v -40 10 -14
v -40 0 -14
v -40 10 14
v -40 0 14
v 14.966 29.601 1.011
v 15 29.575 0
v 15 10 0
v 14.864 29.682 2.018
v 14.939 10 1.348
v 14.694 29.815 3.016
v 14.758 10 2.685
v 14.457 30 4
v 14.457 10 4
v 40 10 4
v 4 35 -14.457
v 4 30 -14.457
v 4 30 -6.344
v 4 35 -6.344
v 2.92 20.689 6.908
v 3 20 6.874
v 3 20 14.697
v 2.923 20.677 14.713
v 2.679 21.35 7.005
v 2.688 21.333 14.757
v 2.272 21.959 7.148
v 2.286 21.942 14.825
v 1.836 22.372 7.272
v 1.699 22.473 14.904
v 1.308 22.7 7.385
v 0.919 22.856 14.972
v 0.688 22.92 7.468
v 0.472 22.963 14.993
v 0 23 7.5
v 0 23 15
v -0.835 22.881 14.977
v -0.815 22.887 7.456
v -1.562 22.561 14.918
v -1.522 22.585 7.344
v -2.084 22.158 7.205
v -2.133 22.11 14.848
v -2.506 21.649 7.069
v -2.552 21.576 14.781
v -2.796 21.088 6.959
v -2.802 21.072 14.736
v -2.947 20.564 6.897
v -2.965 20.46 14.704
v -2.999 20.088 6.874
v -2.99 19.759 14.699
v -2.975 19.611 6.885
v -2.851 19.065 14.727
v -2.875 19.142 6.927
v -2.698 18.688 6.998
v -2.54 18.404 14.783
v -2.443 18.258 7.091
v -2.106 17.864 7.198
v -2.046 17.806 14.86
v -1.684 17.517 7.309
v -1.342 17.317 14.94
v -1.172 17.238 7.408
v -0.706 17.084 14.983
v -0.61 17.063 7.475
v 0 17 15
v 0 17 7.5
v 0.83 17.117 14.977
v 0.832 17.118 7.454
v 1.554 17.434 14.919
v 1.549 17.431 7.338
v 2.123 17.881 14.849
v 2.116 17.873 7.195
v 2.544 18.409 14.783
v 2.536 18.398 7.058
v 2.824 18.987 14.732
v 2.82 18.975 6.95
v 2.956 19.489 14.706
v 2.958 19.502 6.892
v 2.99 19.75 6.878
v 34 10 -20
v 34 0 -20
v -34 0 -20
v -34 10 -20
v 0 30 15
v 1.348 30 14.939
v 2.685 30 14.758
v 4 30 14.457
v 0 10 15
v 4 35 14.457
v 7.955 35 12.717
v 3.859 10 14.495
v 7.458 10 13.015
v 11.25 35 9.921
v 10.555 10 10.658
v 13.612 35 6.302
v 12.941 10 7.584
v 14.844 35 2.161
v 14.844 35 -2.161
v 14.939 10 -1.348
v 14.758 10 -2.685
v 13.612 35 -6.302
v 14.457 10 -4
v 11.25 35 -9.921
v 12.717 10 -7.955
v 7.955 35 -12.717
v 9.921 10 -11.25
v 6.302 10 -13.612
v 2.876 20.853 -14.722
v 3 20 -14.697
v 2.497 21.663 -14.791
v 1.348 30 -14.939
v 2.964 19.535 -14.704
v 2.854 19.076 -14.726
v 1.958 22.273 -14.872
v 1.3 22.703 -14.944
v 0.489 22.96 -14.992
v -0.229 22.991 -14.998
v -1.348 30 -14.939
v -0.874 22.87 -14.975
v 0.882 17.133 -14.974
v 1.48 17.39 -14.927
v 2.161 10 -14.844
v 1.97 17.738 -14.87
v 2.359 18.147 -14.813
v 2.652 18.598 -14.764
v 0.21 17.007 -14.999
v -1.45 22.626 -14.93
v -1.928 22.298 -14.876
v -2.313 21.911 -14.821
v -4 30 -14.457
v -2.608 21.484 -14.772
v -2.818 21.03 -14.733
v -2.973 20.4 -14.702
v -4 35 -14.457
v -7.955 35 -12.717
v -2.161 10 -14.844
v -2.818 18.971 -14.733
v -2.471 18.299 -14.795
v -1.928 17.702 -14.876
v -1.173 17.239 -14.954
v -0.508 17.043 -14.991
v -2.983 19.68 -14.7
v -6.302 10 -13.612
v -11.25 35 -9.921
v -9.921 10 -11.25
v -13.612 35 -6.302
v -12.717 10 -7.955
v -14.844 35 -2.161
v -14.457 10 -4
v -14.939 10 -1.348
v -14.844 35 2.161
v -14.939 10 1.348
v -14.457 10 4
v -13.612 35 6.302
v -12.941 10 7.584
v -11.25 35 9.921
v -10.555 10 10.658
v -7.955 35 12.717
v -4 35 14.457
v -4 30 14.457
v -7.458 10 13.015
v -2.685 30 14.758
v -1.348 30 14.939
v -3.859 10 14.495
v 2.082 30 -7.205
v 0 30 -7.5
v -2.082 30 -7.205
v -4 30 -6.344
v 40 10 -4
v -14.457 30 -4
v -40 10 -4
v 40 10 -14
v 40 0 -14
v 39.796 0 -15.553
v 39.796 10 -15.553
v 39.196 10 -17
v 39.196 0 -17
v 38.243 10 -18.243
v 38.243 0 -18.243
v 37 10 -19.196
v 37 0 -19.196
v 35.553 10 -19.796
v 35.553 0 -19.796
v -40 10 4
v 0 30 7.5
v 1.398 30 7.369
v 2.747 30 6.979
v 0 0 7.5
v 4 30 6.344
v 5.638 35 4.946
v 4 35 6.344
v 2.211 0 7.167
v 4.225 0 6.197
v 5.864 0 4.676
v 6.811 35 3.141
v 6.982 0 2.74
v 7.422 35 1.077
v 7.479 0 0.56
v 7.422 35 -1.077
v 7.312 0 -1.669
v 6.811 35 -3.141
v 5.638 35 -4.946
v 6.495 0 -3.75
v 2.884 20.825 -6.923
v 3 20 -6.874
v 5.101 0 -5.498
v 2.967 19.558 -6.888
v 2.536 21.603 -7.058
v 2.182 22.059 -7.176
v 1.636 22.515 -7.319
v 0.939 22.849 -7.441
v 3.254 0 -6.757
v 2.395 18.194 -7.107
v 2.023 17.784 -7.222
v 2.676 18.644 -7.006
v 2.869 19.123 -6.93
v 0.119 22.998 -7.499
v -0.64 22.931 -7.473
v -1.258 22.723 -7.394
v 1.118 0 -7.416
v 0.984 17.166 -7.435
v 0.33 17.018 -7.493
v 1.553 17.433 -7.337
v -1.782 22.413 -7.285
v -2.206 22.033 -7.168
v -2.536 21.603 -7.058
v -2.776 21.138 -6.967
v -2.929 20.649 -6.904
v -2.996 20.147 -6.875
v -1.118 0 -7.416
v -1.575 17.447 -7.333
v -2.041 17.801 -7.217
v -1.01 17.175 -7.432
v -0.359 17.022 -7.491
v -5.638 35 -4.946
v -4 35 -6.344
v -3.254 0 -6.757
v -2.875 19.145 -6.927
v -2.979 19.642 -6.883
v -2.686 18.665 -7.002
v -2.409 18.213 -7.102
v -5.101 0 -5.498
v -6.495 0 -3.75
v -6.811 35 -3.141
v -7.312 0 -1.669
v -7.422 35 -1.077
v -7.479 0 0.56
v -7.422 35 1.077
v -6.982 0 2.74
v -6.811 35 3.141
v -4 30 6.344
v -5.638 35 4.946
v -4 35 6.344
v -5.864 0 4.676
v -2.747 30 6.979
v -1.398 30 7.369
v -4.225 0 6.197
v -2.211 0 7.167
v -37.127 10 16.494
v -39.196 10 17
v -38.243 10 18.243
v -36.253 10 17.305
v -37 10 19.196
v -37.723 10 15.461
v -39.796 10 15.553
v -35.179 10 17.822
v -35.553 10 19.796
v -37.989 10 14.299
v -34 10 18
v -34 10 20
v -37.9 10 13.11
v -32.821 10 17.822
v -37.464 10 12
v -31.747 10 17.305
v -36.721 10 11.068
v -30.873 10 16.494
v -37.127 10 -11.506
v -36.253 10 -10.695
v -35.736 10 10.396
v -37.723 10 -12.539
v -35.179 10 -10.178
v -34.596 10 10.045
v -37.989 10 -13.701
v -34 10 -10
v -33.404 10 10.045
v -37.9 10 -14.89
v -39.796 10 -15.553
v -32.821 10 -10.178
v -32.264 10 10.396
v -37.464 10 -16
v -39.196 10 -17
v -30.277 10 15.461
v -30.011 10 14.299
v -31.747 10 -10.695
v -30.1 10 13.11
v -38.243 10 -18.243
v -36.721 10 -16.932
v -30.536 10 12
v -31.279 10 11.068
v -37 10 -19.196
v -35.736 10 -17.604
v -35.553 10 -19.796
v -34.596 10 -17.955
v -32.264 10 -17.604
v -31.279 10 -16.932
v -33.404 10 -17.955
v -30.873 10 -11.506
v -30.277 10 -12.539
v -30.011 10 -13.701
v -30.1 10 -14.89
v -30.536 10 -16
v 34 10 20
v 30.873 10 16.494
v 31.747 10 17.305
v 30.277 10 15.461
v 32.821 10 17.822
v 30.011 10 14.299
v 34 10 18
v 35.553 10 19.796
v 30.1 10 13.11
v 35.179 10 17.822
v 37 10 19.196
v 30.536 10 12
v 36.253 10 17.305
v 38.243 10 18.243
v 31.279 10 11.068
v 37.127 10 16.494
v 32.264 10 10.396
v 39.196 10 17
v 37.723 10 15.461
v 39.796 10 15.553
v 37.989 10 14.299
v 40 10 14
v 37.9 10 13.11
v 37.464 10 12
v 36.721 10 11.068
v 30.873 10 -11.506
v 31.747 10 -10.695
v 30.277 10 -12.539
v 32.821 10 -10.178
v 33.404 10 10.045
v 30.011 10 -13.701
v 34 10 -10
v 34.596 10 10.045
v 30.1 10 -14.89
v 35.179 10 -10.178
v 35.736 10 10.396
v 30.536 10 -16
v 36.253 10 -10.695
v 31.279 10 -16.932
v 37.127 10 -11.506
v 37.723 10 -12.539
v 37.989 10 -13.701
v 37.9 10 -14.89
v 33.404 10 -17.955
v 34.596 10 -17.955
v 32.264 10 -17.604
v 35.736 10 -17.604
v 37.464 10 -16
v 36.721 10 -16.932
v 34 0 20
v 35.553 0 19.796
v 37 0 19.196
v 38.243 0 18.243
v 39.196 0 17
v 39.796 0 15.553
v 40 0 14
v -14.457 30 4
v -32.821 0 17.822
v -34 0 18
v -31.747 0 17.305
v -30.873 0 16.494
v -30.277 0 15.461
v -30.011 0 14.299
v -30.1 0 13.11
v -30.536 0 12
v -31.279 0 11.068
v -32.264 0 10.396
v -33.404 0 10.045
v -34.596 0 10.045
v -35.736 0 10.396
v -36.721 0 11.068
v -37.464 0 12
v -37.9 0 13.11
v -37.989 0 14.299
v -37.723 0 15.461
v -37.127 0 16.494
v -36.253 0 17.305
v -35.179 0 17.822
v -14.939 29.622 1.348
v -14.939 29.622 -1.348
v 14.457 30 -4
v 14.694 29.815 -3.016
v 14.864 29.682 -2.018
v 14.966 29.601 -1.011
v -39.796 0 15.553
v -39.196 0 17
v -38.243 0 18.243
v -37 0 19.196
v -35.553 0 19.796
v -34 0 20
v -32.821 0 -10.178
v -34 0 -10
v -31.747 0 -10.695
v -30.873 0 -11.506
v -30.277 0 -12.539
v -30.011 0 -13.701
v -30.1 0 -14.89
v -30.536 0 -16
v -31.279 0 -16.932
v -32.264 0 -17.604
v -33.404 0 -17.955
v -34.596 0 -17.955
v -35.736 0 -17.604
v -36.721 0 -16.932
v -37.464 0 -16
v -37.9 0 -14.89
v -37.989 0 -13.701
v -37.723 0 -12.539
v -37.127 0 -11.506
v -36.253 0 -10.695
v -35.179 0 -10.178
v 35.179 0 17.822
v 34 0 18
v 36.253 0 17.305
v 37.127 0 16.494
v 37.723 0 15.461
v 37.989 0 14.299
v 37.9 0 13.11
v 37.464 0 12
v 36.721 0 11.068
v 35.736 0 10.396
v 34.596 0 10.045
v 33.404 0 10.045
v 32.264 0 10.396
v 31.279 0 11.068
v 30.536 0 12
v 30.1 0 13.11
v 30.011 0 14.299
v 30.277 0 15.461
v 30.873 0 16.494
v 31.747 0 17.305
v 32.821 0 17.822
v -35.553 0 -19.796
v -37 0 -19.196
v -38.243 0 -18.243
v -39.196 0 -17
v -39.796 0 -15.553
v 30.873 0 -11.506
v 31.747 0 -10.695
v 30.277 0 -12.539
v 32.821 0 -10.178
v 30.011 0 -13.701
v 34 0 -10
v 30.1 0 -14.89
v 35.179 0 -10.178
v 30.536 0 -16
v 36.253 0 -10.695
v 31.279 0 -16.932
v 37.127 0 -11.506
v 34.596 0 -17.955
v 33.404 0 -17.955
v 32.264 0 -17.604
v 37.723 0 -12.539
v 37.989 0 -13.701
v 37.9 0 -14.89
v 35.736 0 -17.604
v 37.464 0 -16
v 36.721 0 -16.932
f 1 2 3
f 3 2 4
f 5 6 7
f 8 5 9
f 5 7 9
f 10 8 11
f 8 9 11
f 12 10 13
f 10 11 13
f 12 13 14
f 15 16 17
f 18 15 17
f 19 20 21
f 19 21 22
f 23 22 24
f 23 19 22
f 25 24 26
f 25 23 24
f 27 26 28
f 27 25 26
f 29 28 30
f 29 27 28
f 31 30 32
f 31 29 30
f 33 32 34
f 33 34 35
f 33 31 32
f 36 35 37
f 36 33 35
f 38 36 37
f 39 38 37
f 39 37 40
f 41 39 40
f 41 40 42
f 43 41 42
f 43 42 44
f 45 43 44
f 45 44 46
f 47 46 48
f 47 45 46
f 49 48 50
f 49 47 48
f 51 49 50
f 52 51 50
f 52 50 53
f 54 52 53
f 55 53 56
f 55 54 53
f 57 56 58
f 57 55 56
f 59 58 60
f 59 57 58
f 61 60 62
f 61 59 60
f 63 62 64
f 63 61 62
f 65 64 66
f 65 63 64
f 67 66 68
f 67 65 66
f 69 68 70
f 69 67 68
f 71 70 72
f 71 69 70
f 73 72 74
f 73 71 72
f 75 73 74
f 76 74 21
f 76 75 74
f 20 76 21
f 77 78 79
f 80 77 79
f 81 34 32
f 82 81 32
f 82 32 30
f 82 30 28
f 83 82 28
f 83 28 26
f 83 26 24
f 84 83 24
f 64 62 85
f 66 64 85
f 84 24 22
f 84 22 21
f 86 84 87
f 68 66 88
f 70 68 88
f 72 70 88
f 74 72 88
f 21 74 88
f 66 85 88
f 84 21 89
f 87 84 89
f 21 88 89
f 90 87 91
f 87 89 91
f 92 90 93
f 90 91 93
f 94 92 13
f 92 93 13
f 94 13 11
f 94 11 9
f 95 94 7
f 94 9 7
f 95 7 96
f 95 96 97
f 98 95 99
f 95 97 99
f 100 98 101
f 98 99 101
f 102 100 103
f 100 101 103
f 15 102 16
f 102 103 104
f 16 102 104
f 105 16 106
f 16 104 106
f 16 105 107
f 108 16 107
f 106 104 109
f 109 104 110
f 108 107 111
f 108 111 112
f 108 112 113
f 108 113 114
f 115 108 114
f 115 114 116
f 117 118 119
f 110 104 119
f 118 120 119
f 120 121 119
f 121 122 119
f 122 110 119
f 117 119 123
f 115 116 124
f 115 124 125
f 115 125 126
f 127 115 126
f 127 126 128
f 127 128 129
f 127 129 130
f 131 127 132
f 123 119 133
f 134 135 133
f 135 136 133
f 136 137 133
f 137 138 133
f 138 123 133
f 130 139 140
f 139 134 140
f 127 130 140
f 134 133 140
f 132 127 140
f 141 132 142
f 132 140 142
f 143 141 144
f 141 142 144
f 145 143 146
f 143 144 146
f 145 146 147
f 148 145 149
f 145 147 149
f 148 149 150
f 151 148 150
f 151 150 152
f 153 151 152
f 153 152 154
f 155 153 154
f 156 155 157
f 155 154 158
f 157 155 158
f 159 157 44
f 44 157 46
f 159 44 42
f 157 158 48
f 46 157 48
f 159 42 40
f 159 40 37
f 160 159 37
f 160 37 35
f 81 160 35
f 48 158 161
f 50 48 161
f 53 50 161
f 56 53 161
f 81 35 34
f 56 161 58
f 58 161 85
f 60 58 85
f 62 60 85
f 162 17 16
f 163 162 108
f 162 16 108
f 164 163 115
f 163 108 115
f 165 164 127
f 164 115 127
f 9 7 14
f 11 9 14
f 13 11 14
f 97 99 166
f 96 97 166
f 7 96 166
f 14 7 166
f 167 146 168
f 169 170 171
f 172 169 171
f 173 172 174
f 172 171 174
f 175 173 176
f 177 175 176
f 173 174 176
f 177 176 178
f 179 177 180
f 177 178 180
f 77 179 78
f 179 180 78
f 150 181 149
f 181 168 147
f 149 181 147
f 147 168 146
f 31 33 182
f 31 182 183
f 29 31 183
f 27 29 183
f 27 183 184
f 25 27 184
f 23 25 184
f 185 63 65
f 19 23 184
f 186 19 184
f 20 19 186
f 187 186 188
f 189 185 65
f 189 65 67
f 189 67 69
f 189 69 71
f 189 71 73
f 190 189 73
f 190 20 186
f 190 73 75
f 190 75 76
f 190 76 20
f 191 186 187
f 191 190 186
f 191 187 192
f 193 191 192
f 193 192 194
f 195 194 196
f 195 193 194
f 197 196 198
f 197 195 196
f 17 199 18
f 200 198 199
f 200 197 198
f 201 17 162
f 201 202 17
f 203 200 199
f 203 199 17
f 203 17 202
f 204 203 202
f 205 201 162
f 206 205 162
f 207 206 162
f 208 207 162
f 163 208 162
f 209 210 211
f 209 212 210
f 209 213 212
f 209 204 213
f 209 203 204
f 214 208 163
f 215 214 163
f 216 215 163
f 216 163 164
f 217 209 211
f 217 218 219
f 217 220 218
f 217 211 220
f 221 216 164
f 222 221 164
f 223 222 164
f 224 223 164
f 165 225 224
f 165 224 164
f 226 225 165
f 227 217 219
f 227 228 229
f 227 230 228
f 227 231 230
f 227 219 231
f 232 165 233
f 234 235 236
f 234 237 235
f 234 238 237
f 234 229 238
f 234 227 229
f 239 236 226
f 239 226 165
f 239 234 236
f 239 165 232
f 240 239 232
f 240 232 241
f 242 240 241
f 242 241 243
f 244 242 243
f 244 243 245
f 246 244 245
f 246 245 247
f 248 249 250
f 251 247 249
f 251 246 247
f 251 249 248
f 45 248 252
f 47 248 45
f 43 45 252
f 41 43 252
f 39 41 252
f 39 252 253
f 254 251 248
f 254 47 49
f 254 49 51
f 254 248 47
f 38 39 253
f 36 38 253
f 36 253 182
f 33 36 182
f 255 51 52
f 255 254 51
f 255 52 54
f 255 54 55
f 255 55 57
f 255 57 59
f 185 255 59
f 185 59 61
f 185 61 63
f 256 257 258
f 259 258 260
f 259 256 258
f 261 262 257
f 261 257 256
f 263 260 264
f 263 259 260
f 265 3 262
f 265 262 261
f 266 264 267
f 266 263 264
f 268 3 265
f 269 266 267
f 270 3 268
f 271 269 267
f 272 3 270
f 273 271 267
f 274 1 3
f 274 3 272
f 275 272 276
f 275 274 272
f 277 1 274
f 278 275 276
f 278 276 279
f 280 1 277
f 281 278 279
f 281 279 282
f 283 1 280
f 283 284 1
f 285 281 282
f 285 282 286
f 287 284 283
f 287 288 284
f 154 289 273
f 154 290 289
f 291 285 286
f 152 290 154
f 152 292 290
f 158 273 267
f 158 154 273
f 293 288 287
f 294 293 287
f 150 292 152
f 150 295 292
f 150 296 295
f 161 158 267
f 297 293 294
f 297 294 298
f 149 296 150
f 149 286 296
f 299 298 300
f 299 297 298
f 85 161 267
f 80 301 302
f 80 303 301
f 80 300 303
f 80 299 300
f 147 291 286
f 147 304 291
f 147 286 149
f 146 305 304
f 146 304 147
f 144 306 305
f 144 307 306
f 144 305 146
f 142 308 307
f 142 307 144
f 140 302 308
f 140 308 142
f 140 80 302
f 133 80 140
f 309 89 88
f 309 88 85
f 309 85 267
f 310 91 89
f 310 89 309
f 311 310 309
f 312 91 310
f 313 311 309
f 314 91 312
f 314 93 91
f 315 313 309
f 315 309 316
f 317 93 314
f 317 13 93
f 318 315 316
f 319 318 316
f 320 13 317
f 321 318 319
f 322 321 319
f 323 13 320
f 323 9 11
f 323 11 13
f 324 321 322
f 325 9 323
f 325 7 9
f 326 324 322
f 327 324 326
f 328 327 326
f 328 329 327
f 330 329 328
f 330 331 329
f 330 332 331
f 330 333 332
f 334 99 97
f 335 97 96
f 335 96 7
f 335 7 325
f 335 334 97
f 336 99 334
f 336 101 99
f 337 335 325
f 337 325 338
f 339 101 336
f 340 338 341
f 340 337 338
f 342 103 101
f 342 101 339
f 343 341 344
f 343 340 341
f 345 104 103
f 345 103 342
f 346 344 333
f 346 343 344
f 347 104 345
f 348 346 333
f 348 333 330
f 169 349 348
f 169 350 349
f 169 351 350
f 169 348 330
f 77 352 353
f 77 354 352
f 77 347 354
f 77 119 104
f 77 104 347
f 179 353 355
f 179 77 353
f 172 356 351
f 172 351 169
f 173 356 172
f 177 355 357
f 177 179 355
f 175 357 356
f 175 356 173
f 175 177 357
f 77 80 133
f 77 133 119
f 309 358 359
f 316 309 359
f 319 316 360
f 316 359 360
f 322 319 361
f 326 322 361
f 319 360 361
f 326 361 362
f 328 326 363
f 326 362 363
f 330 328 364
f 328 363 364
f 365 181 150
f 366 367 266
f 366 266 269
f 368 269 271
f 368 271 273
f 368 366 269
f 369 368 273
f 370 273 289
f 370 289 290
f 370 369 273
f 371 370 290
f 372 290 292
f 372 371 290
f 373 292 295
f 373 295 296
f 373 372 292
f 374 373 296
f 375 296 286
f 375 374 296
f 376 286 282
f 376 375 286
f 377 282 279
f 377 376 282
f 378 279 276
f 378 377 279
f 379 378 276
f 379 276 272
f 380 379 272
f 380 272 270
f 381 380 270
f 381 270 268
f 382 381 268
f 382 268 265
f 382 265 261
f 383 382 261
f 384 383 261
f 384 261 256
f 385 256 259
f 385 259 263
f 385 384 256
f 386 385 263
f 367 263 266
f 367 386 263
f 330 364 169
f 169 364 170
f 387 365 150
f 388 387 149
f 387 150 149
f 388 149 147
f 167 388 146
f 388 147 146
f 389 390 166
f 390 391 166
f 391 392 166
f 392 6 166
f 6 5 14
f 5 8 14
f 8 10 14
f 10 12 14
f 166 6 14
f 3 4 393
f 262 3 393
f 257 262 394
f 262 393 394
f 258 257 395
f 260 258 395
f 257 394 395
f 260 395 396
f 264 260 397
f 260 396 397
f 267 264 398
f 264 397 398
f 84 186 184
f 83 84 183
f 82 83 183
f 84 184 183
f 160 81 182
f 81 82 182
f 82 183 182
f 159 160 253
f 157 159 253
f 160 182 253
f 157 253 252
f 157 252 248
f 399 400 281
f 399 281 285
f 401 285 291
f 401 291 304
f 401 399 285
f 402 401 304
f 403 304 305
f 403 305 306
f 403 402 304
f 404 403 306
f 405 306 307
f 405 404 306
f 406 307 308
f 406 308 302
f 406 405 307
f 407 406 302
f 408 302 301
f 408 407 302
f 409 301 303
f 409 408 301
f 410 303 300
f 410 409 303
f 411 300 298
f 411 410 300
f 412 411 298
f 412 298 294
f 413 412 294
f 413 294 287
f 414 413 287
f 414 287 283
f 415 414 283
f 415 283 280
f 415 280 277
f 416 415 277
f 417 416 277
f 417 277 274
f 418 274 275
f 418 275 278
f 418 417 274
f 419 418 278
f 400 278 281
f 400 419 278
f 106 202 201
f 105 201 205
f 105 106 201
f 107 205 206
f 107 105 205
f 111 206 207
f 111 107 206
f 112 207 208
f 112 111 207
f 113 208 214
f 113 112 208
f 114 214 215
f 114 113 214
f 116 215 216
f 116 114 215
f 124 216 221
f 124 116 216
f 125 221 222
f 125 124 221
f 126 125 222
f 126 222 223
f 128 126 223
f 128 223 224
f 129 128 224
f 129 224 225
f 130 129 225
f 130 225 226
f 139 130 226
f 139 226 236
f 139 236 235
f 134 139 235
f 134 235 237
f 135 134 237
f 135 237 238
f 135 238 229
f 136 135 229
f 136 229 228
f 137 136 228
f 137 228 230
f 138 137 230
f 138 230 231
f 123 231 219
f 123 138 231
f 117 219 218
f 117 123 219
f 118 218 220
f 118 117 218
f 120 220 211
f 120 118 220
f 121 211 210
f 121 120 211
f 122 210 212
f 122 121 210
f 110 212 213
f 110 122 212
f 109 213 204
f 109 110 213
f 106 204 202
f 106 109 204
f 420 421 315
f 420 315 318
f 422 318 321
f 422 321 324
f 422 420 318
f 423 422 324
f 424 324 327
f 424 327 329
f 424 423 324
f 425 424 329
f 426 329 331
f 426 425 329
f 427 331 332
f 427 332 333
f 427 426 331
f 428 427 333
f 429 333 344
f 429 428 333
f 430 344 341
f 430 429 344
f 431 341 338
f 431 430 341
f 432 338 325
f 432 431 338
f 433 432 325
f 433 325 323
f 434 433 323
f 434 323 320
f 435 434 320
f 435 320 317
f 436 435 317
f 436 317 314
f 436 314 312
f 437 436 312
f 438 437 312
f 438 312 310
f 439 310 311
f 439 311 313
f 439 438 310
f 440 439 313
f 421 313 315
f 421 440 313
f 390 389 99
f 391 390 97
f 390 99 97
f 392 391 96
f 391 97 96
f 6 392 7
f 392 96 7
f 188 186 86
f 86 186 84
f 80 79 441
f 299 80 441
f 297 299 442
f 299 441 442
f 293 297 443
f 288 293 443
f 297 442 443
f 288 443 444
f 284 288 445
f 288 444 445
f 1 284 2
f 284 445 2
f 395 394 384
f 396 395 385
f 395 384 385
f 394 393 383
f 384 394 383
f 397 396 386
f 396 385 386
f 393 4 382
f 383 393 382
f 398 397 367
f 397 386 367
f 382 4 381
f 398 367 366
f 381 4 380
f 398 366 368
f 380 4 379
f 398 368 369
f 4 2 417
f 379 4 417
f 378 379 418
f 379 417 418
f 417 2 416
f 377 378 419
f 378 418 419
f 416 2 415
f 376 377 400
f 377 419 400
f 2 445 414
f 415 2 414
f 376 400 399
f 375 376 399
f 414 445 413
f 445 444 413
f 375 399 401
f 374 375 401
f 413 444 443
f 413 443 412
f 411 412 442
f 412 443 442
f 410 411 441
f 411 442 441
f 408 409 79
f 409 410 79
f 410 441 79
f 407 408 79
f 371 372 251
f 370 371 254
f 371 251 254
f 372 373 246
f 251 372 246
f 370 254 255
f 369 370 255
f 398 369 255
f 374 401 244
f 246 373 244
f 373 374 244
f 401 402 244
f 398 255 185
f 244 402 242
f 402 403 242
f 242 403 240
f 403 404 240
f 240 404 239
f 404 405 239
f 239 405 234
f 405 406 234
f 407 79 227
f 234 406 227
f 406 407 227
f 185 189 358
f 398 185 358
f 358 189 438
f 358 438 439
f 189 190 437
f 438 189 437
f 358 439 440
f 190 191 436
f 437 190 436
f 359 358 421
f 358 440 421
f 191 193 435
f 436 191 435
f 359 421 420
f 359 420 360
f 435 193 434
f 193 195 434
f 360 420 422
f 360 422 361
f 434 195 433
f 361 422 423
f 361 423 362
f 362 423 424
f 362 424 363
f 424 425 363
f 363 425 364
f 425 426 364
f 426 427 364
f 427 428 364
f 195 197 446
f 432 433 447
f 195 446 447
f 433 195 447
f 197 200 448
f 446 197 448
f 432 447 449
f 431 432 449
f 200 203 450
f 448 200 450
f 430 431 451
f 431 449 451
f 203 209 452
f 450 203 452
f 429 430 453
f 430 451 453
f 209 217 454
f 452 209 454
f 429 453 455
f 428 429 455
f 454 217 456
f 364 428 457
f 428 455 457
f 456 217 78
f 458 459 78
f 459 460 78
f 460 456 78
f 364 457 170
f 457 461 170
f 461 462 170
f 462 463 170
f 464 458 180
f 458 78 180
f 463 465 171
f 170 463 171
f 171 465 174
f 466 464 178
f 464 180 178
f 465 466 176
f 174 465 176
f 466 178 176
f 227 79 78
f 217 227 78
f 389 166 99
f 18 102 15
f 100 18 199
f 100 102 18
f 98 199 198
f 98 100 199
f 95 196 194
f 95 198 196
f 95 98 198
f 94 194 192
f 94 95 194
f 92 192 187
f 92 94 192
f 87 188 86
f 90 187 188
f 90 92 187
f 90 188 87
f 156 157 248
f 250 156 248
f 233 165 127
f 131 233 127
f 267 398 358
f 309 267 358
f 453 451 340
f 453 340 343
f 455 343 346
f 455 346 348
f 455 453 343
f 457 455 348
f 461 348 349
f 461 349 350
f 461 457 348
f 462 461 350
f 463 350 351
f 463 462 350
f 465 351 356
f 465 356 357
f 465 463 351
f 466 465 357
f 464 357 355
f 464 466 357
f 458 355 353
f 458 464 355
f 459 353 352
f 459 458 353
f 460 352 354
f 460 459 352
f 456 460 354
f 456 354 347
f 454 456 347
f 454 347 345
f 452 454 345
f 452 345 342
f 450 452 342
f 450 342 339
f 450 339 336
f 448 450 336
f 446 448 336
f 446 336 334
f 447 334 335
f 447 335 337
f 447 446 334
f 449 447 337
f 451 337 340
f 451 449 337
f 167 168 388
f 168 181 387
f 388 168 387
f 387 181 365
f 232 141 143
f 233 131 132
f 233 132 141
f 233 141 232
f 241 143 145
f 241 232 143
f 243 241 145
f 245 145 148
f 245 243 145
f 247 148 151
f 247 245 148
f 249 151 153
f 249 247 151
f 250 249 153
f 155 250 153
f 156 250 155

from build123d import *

# Parameters (mm, degrees)
SKETCH_2_R               = 4
EXTRUDE_1_DEPTH          = 10
SKETCH_2_3_R             = 15
SKETCH_2_3_R_2           = 7.5
EXTRUDE_2_DEPTH          = 35
EXTRUDE_START            = 10
EXTRUDE_3_DEPTH          = 20
EXTRUDE_3_2_DEPTH        = 20
CUT_EXTRUDE_1_DEPTH      = 59.318093247
CUT_EXTRUDE_START        = -5
CUT_EXTRUDE_2_DEPTH      = 5
CUT_EXTRUDE_3_DEPTH      = 57.789083458
CUT_EXTRUDE_3_DEPTH_BACK = 57.789083458
SKETCH_6_R               = 3


with BuildPart() as part:
    # 草图2 → 凸台-拉伸1 (new body)
    # profile 1 of 4: a face of its own
    with BuildSketch(Plane(origin=(0, 0, 0), x_dir=(1, 0, 0), z_dir=(0, 1, 0))):
        with BuildLine():
            Line((14.456832295, 4), (40, 4))
            Line((40, 4), (40, 14))
            ThreePointArc((40, 14), (38.242640687, 18.242640687), (34, 20))
            Line((34, 20), (-34, 20))
            ThreePointArc((-34, 20), (-38.242640687, 18.242640687), (-40, 14))
            Line((-40, 14), (-40, 4))
            Line((-40, 4), (-14.456832295, 4))
            ThreePointArc((-14.456832295, 4), (0, 15), (14.456832295, 4))
        make_face()
        with Locations(Location((-34, 14, 0), (0, 0, 270))):
            Circle(SKETCH_2_R, mode=Mode.SUBTRACT)
        with Locations(Location((34, 14, 0), (0, 0, 270))):
            Circle(SKETCH_2_R, mode=Mode.SUBTRACT)
    # profile 2 of 4: a face of its own
    with BuildSketch(Plane(origin=(0, 0, 0), x_dir=(1, 0, 0), z_dir=(0, 1, 0))):
        with BuildLine():
            Line((14.456832295, -4), (40, -4))
            Line((40, -4), (40, 4))
            Line((40, 4), (14.456832295, 4))
            ThreePointArc((14.456832295, 4), (14.863587797, 2.018355219), (15, 0))
            ThreePointArc((15, 0), (14.863587797, -2.018355219), (14.456832295, -4))
        make_face()
    # profile 3 of 4: a face of its own
    with BuildSketch(Plane(origin=(0, 0, 0), x_dir=(1, 0, 0), z_dir=(0, 1, 0))):
        with BuildLine():
            Line((-34, -20), (34, -20))
            ThreePointArc((34, -20), (38.242640687, -18.242640687), (40, -14))
            Line((40, -14), (40, -4))
            Line((40, -4), (14.456832295, -4))
            ThreePointArc((14.456832295, -4), (0, -15), (-14.456832295, -4))
            Line((-14.456832295, -4), (-40, -4))
            Line((-40, -4), (-40, -14))
            ThreePointArc((-40, -14), (-38.242640687, -18.242640687), (-34, -20))
        make_face()
        with Locations(Location((-34, -14, 0), (0, 0, 270))):
            Circle(SKETCH_2_R, mode=Mode.SUBTRACT)
        with Locations(Location((34, -14, 0), (0, 0, 270))):
            Circle(SKETCH_2_R, mode=Mode.SUBTRACT)
    # profile 4 of 4: a face of its own
    with BuildSketch(Plane(origin=(0, 0, 0), x_dir=(1, 0, 0), z_dir=(0, 1, 0))):
        with BuildLine():
            Line((-40, 4), (-40, -4))
            Line((-40, -4), (-14.456832295, -4))
            ThreePointArc((-14.456832295, -4), (-15, 0), (-14.456832295, 4))
            Line((-14.456832295, 4), (-40, 4))
        make_face()
    extrude(amount=EXTRUDE_1_DEPTH)

    # 草图2<3> → 凸台-拉伸2 (add)
    with BuildSketch(Plane(origin=(0, 0, 0), x_dir=(1, 0, 0), z_dir=(0, 1, 0))):
        with Locations(Location((0, 0, 0), (0, 0, 270))):
            Circle(SKETCH_2_3_R)
        with Locations(Location((0, 0, 0), (0, 0, 270))):
            Circle(SKETCH_2_3_R_2, mode=Mode.SUBTRACT)
    extrude(amount=EXTRUDE_2_DEPTH)

    # 草图5 → 切除-拉伸2 (cut)
    with BuildSketch(Plane(origin=(0, 35, 0), x_dir=(1, 0, 0), z_dir=(0, 1, 0)).offset(CUT_EXTRUDE_START)):
        with BuildLine():
            Line((-4, -14.456832295), (-4, 14.456832295))
            ThreePointArc((-4, 14.456832295), (0, 15), (4, 14.456832295))
            Line((4, 14.456832295), (4, -14.456832295))
            ThreePointArc((4, -14.456832295), (0, -15), (-4, -14.456832295))
        make_face()
    extrude(amount=CUT_EXTRUDE_2_DEPTH, mode=Mode.SUBTRACT)

    # 草图6 → 切除-拉伸3 (cut, two sides: drawn at the far end of the back side and taken through both)
    with BuildSketch(Plane.XY.offset(-CUT_EXTRUDE_3_DEPTH_BACK)):
        with Locations((0, 20)):
            Circle(SKETCH_6_R)
    extrude(amount=CUT_EXTRUDE_3_DEPTH + CUT_EXTRUDE_3_DEPTH_BACK, mode=Mode.SUBTRACT)


with BuildPart() as body_2:
    # 草图2<4> → 凸台-拉伸3 (new body)
    with BuildSketch(Plane(origin=(0, 0, 0), x_dir=(1, 0, 0), z_dir=(0, 1, 0)).offset(EXTRUDE_START)):
        with BuildLine():
            Line((-40, 4), (-40, -4))
            Line((-40, -4), (-14.456832295, -4))
            ThreePointArc((-14.456832295, -4), (-15, 0), (-14.456832295, 4))
            Line((-14.456832295, 4), (-40, 4))
        make_face()
    extrude(amount=EXTRUDE_3_DEPTH)


with BuildPart() as body_3:
    # 草图2<4> → Extrude 3 2 (new body)
    with BuildSketch(Plane(origin=(0, 0, 0), x_dir=(1, 0, 0), z_dir=(0, 1, 0)).offset(EXTRUDE_START)):
        with BuildLine():
            Line((14.456832295, -4), (40, -4))
            Line((40, -4), (40, 4))
            Line((40, 4), (14.456832295, 4))
            ThreePointArc((14.456832295, 4), (14.863587797, 2.018355219), (15, 0))
            ThreePointArc((15, 0), (14.863587797, -2.018355219), (14.456832295, -4))
        make_face()
    extrude(amount=EXTRUDE_3_2_DEPTH)


with BuildPart() as cut_extrude_1_tool:
    # 草图4 → 切除-拉伸1 (new, through all)
    with BuildSketch(Plane.XY.offset(4)):
        Polygon((-40, 10), (-14.456832295, 30), (-40, 30), align=None)
        Polygon((14.456832295, 30), (40, 10), (40, 30), align=None)
    extrude(amount=-CUT_EXTRUDE_1_DEPTH)


with BuildPart() as body_2_1:
    add(body_2.part)

    # 切除-拉伸1: cut by cut_extrude_1_tool
    add(cut_extrude_1_tool.part, mode=Mode.SUBTRACT)


with BuildPart() as body_3_1:
    add(body_3.part)

    # 切除-拉伸1: cut by cut_extrude_1_tool
    add(cut_extrude_1_tool.part, mode=Mode.SUBTRACT)


solid = Compound([part.part, body_2_1.part, body_3_1.part])
